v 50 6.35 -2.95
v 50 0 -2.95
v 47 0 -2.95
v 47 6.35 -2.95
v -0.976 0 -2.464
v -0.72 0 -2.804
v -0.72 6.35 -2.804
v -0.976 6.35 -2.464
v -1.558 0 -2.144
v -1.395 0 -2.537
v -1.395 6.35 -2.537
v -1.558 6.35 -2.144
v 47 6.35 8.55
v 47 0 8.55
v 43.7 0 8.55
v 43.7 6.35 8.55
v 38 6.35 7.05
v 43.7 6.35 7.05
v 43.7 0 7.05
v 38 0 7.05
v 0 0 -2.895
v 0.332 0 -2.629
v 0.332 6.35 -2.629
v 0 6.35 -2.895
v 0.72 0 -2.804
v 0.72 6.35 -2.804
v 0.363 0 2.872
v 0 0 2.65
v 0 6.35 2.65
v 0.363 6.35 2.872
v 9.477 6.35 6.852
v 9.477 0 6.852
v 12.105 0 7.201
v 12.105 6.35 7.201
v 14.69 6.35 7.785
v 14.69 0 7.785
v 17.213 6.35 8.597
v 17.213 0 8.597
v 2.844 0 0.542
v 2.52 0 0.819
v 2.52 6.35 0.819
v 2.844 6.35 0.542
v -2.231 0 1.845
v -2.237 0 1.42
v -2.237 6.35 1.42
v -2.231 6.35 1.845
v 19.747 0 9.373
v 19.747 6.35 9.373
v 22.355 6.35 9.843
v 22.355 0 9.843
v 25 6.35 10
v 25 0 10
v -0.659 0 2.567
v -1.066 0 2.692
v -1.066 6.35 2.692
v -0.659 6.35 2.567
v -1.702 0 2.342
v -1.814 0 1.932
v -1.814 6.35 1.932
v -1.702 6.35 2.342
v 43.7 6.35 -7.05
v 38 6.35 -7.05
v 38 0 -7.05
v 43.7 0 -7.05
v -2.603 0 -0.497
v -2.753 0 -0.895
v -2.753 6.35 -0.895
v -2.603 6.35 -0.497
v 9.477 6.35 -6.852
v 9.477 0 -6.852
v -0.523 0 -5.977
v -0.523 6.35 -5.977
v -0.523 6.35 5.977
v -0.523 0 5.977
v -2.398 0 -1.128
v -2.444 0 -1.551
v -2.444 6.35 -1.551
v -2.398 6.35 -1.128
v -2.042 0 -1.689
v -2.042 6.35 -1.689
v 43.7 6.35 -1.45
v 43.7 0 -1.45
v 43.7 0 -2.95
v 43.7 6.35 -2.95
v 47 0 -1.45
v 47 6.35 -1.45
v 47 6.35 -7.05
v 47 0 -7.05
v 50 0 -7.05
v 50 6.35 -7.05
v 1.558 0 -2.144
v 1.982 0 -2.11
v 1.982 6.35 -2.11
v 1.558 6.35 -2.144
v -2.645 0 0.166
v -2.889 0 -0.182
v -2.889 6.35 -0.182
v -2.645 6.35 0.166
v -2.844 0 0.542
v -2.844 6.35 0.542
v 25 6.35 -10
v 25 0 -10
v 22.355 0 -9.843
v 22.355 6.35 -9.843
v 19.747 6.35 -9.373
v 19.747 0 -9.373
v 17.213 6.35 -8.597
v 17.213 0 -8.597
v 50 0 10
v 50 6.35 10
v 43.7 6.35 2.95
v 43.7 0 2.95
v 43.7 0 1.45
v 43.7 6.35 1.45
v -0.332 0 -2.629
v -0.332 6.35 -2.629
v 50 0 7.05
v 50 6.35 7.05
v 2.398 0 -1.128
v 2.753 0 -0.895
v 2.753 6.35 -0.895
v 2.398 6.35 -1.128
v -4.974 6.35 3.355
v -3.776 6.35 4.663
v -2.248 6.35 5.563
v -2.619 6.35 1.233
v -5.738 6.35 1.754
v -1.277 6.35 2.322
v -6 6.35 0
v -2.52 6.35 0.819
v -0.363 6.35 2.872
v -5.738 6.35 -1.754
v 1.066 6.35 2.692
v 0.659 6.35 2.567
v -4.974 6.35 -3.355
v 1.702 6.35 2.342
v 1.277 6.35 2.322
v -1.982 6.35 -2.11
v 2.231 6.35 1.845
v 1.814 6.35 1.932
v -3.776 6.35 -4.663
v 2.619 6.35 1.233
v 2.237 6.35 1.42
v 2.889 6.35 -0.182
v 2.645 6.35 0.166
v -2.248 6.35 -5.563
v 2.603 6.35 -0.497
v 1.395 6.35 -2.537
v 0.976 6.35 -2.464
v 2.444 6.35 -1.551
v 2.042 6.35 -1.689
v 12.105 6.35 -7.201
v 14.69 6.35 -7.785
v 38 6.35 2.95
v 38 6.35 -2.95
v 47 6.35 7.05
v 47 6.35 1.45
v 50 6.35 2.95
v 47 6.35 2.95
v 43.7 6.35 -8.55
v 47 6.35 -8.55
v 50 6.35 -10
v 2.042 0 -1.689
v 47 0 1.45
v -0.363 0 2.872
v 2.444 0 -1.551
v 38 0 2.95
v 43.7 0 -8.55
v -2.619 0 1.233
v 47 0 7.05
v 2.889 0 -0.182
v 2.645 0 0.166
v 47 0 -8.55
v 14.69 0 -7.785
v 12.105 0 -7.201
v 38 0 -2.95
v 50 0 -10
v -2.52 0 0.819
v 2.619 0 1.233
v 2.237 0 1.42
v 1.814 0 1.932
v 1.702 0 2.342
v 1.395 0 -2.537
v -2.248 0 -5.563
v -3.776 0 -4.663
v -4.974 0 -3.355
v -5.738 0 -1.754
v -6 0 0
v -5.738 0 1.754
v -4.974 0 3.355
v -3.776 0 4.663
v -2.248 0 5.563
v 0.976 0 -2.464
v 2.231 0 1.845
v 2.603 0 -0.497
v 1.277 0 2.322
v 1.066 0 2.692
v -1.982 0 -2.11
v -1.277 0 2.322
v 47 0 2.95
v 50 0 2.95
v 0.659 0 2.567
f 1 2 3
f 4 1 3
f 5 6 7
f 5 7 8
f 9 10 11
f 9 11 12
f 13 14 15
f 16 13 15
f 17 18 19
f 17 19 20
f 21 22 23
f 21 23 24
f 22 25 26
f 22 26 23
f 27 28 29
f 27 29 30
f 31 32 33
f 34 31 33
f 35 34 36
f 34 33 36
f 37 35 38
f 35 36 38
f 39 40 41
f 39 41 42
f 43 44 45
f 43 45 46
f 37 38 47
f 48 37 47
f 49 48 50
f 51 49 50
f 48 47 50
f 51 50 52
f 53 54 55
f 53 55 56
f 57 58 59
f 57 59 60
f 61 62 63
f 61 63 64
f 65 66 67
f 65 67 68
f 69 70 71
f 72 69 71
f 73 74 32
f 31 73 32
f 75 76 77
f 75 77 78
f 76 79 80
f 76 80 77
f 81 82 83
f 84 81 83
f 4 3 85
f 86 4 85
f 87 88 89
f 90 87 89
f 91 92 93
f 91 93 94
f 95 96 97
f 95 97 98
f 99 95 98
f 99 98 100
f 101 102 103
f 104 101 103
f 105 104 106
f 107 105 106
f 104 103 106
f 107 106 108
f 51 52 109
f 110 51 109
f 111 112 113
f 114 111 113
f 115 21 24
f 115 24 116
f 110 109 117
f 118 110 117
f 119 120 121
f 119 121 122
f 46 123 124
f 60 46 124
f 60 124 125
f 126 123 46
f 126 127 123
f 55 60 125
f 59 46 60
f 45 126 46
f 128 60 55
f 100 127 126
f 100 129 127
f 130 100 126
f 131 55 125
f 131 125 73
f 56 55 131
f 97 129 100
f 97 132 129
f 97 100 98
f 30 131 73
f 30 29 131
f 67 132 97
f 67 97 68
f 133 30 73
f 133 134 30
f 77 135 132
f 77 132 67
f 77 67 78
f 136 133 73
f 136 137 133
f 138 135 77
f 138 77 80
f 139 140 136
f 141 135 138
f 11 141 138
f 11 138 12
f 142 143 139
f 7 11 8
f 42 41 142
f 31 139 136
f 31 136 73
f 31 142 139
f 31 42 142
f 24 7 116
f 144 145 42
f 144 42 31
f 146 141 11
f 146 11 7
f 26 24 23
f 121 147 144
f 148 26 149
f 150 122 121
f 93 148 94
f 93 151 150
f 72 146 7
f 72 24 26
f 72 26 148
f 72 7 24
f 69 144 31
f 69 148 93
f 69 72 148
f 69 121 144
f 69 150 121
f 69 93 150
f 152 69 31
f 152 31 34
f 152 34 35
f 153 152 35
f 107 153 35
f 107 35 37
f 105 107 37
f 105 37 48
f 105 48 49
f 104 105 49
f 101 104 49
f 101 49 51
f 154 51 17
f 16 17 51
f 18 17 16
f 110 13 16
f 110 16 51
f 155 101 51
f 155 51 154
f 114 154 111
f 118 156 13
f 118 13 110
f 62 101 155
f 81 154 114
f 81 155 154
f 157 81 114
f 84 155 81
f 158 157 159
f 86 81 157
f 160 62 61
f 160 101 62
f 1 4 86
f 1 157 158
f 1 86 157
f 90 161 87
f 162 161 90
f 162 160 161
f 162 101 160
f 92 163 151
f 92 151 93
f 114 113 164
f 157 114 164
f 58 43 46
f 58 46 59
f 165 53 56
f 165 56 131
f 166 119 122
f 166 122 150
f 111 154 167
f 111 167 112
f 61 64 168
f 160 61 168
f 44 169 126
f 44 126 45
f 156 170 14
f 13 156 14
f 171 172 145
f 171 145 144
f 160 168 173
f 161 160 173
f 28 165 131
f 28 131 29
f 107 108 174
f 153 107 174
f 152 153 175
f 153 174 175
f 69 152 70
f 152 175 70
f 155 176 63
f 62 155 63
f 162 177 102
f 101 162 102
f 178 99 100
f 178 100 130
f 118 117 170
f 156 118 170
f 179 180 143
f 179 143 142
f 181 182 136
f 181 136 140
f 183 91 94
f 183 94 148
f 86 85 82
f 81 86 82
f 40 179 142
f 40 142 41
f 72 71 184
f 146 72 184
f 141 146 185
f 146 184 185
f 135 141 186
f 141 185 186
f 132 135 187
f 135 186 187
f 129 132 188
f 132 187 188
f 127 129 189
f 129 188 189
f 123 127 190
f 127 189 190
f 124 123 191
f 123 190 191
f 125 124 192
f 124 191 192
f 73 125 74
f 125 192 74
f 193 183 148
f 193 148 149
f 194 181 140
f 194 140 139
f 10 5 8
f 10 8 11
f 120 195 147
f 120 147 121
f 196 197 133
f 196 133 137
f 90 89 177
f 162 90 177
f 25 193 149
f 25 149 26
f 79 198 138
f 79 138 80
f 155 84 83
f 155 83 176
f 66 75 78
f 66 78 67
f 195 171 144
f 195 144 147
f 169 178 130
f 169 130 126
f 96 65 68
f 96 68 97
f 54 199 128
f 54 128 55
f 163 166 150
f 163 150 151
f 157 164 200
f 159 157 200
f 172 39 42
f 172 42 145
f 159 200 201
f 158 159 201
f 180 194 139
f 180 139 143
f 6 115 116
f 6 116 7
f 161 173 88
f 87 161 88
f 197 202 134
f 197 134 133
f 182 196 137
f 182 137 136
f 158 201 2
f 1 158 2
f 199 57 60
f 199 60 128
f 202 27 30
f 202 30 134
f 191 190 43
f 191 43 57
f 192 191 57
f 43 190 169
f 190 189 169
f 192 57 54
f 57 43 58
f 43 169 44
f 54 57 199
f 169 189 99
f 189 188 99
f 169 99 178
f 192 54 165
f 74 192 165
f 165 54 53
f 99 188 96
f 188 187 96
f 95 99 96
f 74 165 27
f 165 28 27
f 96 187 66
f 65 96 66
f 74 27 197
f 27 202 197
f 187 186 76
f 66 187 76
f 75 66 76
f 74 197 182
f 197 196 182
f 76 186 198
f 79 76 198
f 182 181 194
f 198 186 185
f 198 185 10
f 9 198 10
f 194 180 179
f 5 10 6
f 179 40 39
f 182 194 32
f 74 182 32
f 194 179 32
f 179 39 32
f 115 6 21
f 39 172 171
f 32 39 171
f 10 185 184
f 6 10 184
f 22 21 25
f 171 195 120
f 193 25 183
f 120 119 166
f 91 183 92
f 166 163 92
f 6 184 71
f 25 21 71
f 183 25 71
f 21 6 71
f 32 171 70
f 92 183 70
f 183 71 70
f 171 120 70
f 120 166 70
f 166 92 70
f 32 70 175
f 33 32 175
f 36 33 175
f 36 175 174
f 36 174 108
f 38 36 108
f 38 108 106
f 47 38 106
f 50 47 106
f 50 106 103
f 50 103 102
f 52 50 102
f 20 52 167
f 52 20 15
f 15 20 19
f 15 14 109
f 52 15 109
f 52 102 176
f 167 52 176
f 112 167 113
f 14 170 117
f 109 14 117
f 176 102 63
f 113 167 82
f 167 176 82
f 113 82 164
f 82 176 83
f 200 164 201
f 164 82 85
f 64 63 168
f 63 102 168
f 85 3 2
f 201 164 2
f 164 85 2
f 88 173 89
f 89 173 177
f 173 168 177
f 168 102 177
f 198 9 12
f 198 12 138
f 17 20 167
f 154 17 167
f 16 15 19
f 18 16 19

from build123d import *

# Parameters (mm, degrees)
BOSS_EXTRUDE1_DEPTH = 6.35


with BuildPart() as part:
    # Sketch1 → Boss-Extrude1 (new body)
    with BuildSketch(Plane(origin=(0, 0, 0), x_dir=(1, 0, 0), z_dir=(0, 1, 0))):
        with BuildLine():
            Line((50, -10), (50, -7.05))
            Line((50, -7.05), (47, -7.05))
            Line((47, -7.05), (47, -8.55))
            Line((47, -8.55), (43.7, -8.55))
            Line((43.7, -8.55), (43.7, -7.05))
            Line((43.7, -7.05), (38, -7.05))
            Line((38, -7.05), (38, -2.95))
            Line((38, -2.95), (43.7, -2.95))
            Line((43.7, -2.95), (43.7, -1.45))
            Line((43.7, -1.45), (47, -1.45))
            Line((47, -1.45), (47, -2.95))
            Line((47, -2.95), (50, -2.95))
            Line((50, -2.95), (50, 2.95))
            Line((50, 2.95), (47, 2.95))
            Line((47, 2.95), (47, 1.45))
            Line((47, 1.45), (43.7, 1.45))
            Line((43.7, 1.45), (43.7, 2.95))
            Line((43.7, 2.95), (38, 2.95))
            Line((38, 2.95), (38, 7.05))
            Line((38, 7.05), (43.7, 7.05))
            Line((43.7, 7.05), (43.7, 8.55))
            Line((43.7, 8.55), (47, 8.55))
            Line((47, 8.55), (47, 7.05))
            Line((47, 7.05), (50, 7.05))
            Line((50, 7.05), (50, 10))
            Line((50, 10), (25, 10))
            ThreePointArc((25, 10), (21.043842997, 9.646494123), (17.213036448, 8.59717729))
            ThreePointArc((17.213036448, 8.59717729), (13.403865442, 7.463896906), (9.477065544, 6.852054824))
            Line((9.477065544, 6.852054824), (-0.522934456, 5.977168189))
            ThreePointArc((-0.522934456, 5.977168189), (-6, 0), (-0.522934456, -5.977168189))
            Line((-0.522934456, -5.977168189), (9.477065544, -6.852054824))
            ThreePointArc((9.477065544, -6.852054824), (13.403865442, -7.463896906), (17.213036448, -8.59717729))
            ThreePointArc((17.213036448, -8.59717729), (21.043842997, -9.646494123), (25, -10))
            Line((25, -10), (50, -10))
        make_face()
        Polygon((0, 2.895), (-0.332133069, 2.629103958), (-0.719957223, 2.804048251), (-0.975530065, 2.463907688), (-1.394676887, 2.536907839), (-1.557630919, 2.143895035), (-1.981763872, 2.110364176), (-2.041860093, 1.689173573), (-2.444329344, 1.551218571), (-2.397791689, 1.128315123), (-2.753308615, 0.894604199), (-2.603061214, 0.496560484), (-2.889287379, 0.181778554), (-2.64477083, -0.166394877), (-2.843721591, -0.542468906), (-2.520299768, -0.818895035), (-2.619474317, -1.232631049), (-2.237469003, -1.419941007), (-2.230635838, -1.84534245), (-1.814049831, -1.931766863), (-1.701638305, -2.342104199), (-1.276647236, -2.322212702), (-1.06572058, -2.691702927), (-0.659028201, -2.566745377), (-0.362839711, -2.87217206), (0, -2.65), (0.362839711, -2.87217206), (0.659028201, -2.566745377), (1.06572058, -2.691702927), (1.276647236, -2.322212702), (1.701638305, -2.342104199), (1.814049831, -1.931766863), (2.230635838, -1.84534245), (2.237469003, -1.419941007), (2.619474317, -1.232631049), (2.520299768, -0.818895035), (2.843721591, -0.542468906), (2.64477083, -0.166394877), (2.889287379, 0.181778554), (2.603061214, 0.496560484), (2.753308615, 0.894604199), (2.397791689, 1.128315123), (2.444329344, 1.551218571), (2.041860093, 1.689173573), (1.981763872, 2.110364176), (1.557630919, 2.143895035), (1.394676887, 2.536907839), (0.975530065, 2.463907688), (0.719957223, 2.804048251), (0.332133069, 2.629103958), align=None, mode=Mode.SUBTRACT)
    extrude(amount=BOSS_EXTRUDE1_DEPTH)


solid = part.part
